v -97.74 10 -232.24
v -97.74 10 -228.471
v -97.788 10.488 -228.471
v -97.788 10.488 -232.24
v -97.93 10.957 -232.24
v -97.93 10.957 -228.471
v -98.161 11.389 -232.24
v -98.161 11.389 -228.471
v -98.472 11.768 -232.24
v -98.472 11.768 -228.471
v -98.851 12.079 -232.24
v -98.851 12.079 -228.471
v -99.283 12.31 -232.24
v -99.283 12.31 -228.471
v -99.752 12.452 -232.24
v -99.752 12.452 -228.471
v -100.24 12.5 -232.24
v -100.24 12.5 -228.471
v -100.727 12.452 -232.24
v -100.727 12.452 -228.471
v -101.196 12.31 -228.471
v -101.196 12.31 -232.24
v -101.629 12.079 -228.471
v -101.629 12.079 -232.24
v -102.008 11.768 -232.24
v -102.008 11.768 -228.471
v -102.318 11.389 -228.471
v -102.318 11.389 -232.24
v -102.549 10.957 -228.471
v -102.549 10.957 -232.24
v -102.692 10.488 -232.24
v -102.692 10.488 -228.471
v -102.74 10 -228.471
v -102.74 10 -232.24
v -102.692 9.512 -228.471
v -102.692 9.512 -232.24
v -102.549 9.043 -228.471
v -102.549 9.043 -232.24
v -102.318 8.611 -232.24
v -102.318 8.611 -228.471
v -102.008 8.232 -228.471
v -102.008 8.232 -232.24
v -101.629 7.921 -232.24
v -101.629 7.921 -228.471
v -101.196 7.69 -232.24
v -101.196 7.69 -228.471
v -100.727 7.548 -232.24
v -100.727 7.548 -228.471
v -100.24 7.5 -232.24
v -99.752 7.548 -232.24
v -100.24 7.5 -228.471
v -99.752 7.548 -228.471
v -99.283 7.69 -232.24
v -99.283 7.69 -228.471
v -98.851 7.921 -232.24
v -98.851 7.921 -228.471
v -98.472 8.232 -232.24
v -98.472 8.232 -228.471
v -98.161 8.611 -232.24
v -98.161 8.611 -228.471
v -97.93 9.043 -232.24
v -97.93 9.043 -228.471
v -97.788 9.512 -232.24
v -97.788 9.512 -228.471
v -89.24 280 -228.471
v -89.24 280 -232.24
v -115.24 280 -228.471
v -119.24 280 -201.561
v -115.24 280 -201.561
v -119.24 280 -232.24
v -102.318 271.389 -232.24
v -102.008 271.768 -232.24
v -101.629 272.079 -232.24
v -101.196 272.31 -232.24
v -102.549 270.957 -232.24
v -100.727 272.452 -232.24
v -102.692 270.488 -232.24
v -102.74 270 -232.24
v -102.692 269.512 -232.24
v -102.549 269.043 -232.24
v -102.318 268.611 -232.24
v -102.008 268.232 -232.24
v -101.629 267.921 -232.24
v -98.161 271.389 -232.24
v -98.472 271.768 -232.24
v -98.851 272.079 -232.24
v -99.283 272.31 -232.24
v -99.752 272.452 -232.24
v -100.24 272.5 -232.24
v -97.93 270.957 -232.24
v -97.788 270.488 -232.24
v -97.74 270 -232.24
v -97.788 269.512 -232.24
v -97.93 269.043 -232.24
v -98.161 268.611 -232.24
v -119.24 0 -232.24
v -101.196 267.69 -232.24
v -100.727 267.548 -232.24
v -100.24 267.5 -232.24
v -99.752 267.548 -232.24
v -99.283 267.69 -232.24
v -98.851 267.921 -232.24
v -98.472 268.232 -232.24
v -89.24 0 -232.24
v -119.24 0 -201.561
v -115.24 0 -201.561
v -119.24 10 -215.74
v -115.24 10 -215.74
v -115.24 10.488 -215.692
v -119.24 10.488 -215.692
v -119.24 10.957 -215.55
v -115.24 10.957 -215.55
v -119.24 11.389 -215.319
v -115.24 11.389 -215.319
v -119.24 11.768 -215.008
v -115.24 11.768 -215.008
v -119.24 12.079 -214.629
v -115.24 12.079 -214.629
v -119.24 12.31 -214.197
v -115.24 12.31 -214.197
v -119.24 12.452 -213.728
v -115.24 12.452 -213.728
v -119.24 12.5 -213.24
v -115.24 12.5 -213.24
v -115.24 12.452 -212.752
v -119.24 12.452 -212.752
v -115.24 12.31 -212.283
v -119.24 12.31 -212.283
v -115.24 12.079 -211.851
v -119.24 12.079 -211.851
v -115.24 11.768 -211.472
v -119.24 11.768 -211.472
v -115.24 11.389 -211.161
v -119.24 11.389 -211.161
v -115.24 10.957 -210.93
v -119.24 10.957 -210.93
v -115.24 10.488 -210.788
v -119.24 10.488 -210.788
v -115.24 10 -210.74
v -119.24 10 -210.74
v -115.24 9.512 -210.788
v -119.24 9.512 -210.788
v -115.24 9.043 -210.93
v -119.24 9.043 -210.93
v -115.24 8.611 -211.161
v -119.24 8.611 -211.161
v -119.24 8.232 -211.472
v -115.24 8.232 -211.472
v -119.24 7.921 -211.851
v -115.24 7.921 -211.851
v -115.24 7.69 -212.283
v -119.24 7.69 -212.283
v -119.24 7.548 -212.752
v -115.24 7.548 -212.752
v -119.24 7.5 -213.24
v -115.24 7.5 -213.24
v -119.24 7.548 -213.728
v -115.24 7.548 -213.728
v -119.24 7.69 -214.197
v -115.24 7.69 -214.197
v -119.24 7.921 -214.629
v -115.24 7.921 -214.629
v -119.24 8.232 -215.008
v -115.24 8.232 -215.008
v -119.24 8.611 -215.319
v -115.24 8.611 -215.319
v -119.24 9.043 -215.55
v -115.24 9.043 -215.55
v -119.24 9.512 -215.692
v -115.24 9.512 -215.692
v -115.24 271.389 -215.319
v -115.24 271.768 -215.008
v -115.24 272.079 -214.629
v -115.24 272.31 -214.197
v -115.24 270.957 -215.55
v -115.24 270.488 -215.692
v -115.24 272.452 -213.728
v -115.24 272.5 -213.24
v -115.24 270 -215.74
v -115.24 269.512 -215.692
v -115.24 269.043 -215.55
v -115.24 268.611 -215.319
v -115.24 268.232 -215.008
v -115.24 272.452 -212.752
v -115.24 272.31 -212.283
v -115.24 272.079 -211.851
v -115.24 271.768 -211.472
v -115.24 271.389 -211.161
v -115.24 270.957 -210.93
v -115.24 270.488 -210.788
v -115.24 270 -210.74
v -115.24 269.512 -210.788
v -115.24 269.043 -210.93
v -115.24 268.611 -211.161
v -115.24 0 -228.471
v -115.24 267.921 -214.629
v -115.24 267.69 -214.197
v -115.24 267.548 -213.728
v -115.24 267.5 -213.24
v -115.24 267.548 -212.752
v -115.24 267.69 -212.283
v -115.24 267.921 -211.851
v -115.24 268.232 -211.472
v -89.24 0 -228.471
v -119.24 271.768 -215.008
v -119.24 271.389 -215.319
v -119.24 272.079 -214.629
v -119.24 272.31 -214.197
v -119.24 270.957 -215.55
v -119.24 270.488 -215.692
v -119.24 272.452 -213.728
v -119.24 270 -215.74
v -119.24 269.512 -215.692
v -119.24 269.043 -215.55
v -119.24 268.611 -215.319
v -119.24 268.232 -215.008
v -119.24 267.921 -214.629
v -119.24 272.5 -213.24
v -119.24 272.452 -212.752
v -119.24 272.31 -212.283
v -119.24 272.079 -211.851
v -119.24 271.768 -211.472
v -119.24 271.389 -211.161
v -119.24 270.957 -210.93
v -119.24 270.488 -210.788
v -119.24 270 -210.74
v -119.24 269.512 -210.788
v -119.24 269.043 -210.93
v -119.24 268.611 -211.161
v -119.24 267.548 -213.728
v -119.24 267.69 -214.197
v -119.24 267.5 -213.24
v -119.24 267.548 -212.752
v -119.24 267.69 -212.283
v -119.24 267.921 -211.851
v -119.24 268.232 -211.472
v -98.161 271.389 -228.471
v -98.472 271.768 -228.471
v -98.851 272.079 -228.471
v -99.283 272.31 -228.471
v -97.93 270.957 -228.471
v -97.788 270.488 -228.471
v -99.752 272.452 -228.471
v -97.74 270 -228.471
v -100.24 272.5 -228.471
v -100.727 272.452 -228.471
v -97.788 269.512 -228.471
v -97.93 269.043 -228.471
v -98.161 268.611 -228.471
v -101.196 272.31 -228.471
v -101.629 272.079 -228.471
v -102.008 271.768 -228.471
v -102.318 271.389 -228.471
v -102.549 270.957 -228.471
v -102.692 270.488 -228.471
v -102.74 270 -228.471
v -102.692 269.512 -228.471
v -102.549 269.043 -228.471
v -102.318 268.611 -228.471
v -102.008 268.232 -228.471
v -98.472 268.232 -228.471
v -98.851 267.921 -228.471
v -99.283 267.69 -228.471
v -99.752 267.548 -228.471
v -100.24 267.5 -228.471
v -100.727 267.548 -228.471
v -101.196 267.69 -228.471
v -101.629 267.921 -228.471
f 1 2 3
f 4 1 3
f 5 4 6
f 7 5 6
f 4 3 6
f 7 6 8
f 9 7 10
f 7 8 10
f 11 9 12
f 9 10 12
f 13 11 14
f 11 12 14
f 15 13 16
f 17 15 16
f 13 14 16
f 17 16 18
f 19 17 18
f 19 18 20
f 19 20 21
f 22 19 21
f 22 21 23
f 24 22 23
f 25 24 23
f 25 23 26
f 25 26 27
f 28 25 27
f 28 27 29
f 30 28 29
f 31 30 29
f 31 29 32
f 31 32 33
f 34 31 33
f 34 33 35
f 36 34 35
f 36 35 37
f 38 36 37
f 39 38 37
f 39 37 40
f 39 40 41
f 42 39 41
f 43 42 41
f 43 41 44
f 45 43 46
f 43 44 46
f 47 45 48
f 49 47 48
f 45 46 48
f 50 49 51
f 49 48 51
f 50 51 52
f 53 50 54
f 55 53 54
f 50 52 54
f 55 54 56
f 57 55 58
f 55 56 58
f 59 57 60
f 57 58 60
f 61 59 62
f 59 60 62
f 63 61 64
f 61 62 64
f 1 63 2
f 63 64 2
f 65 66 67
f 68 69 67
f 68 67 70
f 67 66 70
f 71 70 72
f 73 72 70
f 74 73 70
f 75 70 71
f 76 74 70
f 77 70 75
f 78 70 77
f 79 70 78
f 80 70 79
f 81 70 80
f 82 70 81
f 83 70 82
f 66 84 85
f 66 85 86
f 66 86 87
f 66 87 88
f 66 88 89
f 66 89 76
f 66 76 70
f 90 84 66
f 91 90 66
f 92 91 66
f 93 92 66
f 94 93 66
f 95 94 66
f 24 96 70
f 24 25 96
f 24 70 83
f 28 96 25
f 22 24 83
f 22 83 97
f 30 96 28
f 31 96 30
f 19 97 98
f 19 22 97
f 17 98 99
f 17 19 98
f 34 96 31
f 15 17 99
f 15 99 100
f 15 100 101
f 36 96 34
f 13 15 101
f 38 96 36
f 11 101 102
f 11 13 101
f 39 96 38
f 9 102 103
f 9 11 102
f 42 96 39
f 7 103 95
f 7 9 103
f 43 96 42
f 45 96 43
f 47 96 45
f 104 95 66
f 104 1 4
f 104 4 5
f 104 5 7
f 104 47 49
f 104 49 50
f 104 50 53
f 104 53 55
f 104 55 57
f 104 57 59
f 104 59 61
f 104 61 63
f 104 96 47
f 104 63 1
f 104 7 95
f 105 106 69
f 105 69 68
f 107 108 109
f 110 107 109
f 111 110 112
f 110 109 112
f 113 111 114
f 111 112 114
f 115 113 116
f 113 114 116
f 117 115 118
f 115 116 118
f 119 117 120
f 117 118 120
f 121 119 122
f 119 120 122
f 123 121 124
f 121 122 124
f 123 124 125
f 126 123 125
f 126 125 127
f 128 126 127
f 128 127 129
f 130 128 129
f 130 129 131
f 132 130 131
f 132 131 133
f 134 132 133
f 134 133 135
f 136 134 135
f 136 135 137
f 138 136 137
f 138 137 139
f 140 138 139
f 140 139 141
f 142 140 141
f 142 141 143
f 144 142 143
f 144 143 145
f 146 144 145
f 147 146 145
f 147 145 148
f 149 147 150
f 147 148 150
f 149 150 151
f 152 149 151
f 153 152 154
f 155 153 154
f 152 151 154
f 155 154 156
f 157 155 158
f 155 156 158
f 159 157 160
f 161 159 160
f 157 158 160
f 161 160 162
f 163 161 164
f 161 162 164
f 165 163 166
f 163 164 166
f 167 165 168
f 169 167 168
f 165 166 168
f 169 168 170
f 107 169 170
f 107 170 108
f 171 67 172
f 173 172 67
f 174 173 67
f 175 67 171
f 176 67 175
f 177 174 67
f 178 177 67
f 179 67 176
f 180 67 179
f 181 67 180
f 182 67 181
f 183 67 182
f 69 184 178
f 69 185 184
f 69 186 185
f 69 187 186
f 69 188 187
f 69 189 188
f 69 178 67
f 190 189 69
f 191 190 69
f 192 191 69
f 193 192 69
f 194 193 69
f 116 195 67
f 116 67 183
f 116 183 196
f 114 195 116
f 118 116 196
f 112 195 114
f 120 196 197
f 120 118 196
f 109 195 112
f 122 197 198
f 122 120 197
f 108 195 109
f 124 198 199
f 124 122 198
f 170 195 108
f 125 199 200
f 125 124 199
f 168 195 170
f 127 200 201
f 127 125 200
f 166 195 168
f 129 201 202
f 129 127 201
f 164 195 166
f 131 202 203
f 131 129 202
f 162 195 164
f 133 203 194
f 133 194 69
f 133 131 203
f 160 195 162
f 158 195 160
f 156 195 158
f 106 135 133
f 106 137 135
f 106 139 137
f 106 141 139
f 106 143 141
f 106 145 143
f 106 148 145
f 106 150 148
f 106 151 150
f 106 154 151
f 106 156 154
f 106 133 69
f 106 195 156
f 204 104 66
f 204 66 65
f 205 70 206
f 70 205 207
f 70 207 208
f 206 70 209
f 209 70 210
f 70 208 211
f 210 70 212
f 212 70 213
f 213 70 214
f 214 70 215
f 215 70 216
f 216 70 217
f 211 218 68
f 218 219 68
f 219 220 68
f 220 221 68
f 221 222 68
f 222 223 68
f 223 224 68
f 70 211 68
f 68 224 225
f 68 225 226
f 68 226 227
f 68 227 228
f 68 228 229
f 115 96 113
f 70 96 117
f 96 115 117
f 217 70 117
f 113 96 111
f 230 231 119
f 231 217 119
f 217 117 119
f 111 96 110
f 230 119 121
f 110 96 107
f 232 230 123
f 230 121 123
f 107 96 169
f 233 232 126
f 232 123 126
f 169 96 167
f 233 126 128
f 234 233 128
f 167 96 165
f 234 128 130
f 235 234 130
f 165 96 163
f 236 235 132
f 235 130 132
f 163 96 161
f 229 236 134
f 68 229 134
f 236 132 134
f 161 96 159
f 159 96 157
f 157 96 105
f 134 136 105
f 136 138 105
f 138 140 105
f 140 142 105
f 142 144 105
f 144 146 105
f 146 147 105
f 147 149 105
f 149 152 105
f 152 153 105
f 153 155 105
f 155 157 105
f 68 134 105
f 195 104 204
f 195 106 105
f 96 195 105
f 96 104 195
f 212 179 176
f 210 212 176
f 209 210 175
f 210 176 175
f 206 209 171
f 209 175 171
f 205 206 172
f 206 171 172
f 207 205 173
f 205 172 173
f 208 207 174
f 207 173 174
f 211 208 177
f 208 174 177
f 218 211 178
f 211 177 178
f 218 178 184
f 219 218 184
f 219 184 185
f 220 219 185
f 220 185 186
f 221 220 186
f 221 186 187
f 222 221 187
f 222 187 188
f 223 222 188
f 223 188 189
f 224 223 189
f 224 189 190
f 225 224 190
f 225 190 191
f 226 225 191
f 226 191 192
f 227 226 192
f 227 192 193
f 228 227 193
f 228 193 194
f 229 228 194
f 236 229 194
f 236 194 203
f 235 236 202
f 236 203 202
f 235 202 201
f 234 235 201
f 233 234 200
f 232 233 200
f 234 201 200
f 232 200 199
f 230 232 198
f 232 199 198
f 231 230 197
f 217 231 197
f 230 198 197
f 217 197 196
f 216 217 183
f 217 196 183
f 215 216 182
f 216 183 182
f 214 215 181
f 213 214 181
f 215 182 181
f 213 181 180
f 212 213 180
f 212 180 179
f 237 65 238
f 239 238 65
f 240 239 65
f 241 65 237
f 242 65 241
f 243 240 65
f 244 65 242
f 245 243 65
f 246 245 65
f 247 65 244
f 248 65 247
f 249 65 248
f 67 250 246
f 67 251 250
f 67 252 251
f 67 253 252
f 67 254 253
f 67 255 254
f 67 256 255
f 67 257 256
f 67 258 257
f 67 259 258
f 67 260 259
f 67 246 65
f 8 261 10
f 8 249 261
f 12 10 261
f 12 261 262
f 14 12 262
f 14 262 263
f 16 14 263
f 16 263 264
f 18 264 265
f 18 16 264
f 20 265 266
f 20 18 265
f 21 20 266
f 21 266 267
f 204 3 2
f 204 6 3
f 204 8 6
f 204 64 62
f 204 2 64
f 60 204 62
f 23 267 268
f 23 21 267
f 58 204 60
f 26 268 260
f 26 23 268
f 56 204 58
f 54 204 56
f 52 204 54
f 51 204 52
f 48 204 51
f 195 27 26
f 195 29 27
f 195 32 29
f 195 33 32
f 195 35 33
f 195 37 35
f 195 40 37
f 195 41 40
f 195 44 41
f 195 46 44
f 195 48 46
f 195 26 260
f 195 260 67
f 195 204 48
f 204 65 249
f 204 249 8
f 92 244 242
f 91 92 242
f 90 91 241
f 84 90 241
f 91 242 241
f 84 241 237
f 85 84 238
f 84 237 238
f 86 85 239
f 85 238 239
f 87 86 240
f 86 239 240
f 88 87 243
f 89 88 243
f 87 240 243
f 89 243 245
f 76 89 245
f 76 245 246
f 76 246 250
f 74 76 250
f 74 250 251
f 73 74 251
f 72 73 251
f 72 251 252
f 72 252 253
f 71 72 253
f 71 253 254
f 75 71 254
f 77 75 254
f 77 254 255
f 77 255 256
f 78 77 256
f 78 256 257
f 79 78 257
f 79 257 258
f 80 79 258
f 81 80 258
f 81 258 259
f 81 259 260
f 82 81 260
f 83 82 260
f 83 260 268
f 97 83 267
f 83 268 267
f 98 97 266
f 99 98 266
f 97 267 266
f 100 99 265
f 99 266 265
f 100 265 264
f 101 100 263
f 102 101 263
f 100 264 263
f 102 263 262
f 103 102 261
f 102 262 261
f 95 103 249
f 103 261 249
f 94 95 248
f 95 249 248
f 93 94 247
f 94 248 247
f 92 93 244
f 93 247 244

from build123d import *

# Parameters (mm, degrees)
EXTRUDE_1_DEPTH        = 280
HOLE_WIZARD_M6_3_D     = 5
HOLE_WIZARD_M6_3_DEPTH = 17
HOLE_WIZARD_M6_3_TIP   = 1.502151548
HOLE_WIZARD_M6_4_D     = 5
HOLE_WIZARD_M6_4_DEPTH = 17
HOLE_WIZARD_M6_4_TIP   = 1.502151548


with BuildPart() as part:
    # 草图1 → 凸台-拉伸1 (new body)
    with BuildSketch(Plane(origin=(0, 0, 0), x_dir=(1, 0, 0), z_dir=(0, 1, 0))):
        Polygon((-119.239761807, 232.240117312), (-89.239761807, 232.240117312), (-89.239761807, 228.470843435), (-115.239761807, 228.470843435), (-115.239761807, 201.561077594), (-119.239761807, 201.561077594), (-119.239761807, 228.23121253), align=None)
    extrude(amount=EXTRUDE_1_DEPTH)

    # M6 螺纹孔3
    with Locations(Plane.ZY.offset(119.239761807)):
        with Locations((-213.240117312, 10), (-213.240117312, 270)):
            Hole(HOLE_WIZARD_M6_3_D / 2, depth=HOLE_WIZARD_M6_3_DEPTH)
            with Locations((0, 0, -(HOLE_WIZARD_M6_3_DEPTH + HOLE_WIZARD_M6_3_TIP / 2))):  # 118° drill point
                Cone(0, HOLE_WIZARD_M6_3_D / 2, HOLE_WIZARD_M6_3_TIP, mode=Mode.SUBTRACT)

    # M6 螺纹孔4
    with Locations(Plane(origin=(0, 0, -232.240117312), x_dir=(-1, 0, 0), z_dir=(0, 0, -1))):
        with Locations((100.239761807, 10), (100.239761807, 270)):
            Hole(HOLE_WIZARD_M6_4_D / 2, depth=HOLE_WIZARD_M6_4_DEPTH)
            with Locations((0, 0, -(HOLE_WIZARD_M6_4_DEPTH + HOLE_WIZARD_M6_4_TIP / 2))):  # 118° drill point
                Cone(0, HOLE_WIZARD_M6_4_D / 2, HOLE_WIZARD_M6_4_TIP, mode=Mode.SUBTRACT)


solid = part.part
